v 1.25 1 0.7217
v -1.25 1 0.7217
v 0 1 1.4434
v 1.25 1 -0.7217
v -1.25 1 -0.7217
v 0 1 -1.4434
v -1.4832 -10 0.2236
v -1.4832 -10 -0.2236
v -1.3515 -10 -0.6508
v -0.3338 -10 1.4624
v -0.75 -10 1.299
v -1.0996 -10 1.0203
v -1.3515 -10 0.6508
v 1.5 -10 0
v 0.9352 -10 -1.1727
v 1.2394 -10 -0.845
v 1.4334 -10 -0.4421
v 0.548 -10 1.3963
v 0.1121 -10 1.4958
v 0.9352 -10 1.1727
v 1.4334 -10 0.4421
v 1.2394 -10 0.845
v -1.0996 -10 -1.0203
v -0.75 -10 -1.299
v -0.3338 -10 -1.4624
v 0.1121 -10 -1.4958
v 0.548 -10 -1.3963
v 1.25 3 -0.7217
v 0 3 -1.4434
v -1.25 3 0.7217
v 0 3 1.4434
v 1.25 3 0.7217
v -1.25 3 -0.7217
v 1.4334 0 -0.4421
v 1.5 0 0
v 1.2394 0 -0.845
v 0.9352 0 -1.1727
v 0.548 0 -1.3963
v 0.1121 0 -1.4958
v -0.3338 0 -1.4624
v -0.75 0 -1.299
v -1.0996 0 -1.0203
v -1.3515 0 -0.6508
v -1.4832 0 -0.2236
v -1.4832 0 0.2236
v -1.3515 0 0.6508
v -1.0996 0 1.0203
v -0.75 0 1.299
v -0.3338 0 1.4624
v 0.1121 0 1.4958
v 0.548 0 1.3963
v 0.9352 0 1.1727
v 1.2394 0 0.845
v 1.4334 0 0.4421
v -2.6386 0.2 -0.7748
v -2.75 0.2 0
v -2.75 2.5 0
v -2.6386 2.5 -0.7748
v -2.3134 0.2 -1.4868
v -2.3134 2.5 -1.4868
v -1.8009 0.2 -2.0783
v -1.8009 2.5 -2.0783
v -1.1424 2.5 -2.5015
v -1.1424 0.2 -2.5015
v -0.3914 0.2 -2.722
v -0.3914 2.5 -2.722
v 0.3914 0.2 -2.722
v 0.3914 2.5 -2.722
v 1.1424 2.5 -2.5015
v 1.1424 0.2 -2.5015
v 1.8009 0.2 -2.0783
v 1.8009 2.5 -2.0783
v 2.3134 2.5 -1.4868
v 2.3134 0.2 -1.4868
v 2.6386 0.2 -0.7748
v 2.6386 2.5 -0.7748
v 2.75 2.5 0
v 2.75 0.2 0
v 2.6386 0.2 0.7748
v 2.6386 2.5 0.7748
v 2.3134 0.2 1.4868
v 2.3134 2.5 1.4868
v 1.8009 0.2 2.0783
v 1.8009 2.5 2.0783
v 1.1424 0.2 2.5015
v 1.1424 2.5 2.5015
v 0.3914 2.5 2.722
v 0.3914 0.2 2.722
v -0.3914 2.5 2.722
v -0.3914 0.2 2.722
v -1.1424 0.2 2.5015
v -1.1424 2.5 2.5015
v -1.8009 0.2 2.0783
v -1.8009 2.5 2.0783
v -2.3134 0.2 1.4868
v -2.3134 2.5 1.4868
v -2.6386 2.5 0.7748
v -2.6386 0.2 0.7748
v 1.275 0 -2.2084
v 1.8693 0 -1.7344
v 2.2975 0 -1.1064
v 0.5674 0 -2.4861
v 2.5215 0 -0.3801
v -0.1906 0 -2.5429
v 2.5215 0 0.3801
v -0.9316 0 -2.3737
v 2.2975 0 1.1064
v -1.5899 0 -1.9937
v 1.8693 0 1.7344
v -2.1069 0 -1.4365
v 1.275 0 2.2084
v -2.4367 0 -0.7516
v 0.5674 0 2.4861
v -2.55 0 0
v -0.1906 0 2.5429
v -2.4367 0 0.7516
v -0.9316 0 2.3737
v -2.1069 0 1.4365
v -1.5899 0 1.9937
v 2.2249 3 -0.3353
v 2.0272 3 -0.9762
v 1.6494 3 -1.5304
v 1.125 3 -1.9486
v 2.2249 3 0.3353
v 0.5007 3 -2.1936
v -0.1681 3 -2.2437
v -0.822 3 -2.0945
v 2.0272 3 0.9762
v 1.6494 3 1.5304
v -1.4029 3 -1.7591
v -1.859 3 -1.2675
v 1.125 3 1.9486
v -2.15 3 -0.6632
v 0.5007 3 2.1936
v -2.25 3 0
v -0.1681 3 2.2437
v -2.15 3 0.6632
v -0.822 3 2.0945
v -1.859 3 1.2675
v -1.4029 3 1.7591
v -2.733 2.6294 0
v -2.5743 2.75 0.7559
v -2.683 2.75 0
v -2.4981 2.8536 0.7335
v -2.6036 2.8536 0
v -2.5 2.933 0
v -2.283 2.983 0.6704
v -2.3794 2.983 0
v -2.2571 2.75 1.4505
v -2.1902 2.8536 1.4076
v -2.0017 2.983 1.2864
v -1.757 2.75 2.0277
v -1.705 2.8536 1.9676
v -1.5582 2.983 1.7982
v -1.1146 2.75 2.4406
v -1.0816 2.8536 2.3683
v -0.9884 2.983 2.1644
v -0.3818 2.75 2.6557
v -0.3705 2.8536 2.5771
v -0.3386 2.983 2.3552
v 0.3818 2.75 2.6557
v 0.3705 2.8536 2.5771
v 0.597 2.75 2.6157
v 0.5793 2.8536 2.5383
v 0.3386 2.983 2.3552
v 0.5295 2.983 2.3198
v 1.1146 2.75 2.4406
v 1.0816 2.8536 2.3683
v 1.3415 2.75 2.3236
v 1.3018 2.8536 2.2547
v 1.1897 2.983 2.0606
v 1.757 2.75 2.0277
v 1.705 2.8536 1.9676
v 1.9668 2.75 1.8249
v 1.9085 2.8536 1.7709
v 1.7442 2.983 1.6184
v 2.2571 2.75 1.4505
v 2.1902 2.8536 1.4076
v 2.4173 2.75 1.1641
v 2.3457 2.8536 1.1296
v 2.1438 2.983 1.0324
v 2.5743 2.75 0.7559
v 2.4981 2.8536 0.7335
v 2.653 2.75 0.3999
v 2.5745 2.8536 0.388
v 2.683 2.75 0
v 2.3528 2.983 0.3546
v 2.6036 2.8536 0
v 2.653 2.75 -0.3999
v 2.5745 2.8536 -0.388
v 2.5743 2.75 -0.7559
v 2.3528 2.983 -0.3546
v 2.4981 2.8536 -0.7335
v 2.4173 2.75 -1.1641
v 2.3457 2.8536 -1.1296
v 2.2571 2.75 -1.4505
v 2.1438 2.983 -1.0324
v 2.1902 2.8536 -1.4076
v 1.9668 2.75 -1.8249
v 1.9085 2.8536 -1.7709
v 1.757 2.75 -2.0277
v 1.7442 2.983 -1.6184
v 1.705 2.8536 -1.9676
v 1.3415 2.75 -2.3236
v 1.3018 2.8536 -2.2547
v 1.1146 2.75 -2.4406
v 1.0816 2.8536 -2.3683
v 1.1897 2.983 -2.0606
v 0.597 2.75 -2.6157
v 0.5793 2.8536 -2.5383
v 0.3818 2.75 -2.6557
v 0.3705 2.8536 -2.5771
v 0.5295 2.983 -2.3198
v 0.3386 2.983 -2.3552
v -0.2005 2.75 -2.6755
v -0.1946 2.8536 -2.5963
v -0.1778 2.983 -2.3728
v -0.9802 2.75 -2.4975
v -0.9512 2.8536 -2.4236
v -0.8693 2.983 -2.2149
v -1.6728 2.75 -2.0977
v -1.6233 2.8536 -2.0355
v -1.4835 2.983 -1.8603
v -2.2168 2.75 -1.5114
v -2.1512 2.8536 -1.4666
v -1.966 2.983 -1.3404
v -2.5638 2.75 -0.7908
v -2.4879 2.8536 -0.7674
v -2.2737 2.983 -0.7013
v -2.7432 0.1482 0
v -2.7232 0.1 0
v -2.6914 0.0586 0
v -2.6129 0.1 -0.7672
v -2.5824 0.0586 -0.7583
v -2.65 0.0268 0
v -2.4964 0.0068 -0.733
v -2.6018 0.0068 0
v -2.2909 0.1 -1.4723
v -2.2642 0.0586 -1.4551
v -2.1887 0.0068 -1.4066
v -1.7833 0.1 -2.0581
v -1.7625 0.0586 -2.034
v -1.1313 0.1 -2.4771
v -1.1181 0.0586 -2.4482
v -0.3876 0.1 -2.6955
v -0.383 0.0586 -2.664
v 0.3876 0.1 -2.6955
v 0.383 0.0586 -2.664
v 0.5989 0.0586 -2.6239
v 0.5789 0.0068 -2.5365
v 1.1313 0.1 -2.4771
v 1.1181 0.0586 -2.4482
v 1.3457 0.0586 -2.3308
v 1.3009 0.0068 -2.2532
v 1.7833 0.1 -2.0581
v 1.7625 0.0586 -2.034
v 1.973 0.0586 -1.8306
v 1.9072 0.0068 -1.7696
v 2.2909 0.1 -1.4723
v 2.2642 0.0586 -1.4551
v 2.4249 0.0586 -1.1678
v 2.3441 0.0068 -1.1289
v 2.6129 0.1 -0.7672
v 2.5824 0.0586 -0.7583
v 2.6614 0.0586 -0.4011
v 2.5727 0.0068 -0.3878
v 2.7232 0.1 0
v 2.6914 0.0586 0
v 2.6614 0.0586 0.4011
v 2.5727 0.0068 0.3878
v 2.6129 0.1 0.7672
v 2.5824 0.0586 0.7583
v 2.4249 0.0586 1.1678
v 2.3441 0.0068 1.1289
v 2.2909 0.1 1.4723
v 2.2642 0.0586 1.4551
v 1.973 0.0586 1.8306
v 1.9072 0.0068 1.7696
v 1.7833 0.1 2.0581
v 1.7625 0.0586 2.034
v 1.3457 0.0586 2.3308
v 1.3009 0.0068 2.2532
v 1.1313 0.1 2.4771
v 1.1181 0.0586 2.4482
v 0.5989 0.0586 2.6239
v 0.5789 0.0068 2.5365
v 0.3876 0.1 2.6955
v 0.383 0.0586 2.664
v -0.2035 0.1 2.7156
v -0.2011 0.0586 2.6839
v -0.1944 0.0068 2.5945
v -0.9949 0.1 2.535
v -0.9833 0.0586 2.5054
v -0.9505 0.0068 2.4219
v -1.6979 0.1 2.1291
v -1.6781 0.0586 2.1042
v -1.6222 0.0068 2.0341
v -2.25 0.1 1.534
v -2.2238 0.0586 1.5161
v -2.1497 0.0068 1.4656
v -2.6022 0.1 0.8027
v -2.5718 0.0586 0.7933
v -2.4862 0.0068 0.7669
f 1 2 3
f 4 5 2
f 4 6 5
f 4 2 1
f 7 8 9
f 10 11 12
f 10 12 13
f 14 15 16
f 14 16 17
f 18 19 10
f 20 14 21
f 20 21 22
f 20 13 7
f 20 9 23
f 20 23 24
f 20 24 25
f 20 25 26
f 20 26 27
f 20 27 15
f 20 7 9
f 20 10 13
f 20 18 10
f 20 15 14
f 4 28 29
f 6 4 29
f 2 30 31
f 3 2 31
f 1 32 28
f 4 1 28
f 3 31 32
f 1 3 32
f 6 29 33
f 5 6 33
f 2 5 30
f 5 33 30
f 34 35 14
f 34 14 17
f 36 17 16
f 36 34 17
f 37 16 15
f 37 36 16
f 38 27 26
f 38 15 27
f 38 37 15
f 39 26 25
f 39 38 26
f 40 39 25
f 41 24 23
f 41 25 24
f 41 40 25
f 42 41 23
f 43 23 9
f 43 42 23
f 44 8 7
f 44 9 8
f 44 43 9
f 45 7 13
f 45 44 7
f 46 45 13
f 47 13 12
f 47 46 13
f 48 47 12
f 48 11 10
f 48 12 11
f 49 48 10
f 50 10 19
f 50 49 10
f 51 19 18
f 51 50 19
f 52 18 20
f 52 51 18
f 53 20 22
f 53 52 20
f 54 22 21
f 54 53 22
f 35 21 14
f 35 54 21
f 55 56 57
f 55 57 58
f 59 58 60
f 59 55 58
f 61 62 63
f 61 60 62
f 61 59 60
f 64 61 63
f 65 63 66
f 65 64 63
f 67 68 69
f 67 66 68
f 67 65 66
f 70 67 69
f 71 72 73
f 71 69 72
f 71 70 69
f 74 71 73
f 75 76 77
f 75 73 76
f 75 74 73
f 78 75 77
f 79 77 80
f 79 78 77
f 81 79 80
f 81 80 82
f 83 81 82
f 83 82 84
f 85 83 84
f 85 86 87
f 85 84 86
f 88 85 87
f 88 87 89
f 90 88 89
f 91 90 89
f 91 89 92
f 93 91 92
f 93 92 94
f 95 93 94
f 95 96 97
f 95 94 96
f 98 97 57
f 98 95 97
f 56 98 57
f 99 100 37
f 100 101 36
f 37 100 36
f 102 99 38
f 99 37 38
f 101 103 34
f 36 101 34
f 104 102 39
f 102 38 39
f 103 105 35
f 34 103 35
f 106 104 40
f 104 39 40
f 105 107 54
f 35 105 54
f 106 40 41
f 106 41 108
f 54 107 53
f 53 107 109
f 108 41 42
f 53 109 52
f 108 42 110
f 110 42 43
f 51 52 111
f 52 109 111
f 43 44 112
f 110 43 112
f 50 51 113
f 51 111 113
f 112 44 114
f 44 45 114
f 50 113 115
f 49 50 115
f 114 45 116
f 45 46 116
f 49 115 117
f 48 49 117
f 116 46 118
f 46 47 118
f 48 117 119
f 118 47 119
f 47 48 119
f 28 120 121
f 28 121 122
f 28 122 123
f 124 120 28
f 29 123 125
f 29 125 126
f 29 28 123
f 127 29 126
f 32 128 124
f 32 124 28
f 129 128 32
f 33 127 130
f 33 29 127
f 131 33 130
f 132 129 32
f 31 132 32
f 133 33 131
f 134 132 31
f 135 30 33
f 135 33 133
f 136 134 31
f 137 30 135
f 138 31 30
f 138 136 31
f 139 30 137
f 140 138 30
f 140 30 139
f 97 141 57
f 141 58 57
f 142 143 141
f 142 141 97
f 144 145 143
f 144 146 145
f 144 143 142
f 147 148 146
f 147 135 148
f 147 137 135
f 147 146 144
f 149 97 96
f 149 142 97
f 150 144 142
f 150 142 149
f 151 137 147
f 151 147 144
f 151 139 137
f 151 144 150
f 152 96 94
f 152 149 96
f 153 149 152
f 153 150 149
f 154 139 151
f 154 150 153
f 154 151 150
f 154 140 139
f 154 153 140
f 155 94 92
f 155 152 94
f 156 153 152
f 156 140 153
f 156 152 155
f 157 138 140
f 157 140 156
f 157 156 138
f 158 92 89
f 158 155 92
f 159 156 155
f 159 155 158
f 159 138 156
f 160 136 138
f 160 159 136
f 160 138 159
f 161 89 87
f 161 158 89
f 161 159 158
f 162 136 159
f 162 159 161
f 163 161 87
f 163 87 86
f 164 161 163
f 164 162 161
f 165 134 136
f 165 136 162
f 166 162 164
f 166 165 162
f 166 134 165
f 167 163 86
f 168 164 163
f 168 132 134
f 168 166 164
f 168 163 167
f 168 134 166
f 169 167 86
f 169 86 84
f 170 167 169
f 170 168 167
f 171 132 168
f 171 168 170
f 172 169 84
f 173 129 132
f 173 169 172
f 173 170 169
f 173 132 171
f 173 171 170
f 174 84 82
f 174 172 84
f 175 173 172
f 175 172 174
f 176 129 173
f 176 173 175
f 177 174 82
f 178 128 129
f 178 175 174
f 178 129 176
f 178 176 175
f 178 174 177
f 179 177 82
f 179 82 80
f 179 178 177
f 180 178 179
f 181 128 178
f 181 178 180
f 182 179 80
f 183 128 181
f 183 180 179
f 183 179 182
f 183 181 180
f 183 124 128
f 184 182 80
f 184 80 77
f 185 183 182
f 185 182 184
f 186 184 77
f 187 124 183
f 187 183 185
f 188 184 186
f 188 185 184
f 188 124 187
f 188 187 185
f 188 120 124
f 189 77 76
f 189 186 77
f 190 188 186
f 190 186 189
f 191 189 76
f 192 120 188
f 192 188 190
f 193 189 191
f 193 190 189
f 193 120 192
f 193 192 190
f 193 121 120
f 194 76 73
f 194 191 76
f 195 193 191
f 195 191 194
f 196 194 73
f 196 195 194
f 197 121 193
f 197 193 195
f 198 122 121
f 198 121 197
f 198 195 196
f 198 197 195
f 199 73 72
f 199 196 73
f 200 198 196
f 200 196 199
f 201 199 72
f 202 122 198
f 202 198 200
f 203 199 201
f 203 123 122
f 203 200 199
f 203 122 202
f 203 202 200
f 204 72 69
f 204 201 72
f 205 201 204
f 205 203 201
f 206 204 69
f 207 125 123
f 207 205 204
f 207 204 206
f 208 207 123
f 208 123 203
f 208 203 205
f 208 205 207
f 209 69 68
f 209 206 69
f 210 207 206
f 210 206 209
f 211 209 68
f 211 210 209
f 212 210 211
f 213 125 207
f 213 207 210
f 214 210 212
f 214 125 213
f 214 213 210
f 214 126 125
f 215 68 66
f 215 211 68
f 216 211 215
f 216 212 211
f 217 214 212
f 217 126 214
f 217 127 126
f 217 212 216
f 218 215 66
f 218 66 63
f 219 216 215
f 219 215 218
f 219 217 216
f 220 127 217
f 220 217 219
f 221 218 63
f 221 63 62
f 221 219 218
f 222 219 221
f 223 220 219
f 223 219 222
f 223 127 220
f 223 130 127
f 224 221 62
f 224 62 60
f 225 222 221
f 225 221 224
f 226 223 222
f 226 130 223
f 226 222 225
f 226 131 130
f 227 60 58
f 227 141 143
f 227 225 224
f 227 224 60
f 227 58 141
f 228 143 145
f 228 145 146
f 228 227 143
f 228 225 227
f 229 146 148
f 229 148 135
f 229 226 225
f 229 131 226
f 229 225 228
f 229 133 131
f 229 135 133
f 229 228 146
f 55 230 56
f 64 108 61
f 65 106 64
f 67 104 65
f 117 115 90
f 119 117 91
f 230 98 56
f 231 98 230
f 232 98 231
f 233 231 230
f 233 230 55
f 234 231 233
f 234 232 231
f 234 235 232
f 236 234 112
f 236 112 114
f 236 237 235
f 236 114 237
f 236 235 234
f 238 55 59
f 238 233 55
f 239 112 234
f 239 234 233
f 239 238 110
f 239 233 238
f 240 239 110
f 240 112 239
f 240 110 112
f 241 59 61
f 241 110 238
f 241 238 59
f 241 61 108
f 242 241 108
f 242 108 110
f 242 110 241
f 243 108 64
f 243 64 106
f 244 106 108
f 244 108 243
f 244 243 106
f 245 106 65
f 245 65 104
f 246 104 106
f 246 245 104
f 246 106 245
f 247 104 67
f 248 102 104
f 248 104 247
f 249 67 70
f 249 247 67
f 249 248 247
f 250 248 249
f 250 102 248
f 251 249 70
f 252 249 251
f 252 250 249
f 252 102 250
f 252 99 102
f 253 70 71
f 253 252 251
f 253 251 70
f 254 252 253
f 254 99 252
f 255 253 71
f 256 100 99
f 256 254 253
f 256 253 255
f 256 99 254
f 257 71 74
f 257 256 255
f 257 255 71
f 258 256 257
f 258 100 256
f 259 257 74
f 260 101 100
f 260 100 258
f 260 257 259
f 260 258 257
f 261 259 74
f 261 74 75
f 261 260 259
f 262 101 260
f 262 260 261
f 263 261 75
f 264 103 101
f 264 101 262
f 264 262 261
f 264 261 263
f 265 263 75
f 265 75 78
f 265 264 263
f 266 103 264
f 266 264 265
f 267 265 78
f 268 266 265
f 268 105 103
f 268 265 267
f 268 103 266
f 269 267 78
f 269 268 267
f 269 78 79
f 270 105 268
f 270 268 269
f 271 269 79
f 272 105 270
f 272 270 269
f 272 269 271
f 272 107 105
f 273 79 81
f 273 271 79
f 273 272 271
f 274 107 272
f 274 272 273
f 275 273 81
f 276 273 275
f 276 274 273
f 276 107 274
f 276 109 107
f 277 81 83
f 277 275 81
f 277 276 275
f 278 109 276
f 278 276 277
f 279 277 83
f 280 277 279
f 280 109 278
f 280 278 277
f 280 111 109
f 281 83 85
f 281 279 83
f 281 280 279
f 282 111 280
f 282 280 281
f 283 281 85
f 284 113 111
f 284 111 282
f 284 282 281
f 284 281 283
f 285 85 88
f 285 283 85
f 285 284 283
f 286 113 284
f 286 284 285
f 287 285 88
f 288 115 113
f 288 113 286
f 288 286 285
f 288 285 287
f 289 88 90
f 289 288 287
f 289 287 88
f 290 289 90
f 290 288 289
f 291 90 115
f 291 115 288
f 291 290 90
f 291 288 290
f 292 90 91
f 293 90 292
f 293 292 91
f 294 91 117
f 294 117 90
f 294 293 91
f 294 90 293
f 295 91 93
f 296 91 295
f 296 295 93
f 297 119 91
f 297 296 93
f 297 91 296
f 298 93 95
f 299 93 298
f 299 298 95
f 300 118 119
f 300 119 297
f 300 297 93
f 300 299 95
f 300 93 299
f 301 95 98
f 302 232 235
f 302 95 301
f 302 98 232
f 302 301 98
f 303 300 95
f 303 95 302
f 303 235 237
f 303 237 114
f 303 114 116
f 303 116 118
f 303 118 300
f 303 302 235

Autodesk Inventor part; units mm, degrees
ref_plane "YZ Plane" through (0, 0, 0) normal (1, 0, 0) x (0, 1, 0)
ref_plane "XZ Plane" through (0, 0, 0) normal (0, 1, 0) x (-1, 0, 0)
ref_plane "XY Plane" through (0, 0, 0) normal (0, 0, 1) x (1, 0, 0)
sketch "スケッチ1" plane through (0, 0, 0) normal (0, 1, 0) x (-1, 0, 0)
  circle A0 centre (0, 0) radius 2.75
  dimension "d0" = 5.5
extrude "押し出し1" add sketch "スケッチ1" along normal blind 3
sketch "スケッチ2" plane through (0, 0, 0) normal (0, -1, 0) x (1, 0, 0)
  circle A0 centre (0, 0) radius 1.5
  dimension "d3" = 3
extrude "押し出し2" add sketch "スケッチ2" along normal blind 10
fillet "フィレット1" radius 0.5 1 edges at (2.75, 3, 0)
fillet "フィレット1" radius 0.2 1 edges at (2.75, 0, 0)
sketch "スケッチ3" plane through (0, 3, 0) normal (0, 1, 0) x (1, 0, 0)
  line L0 (0, 1.4434) -> (-1.25, 0.7217)
  line L1 (-1.25, 0.7217) -> (-1.25, -0.7217)
  line L2 (-1.25, -0.7217) -> (0, -1.4434)
  line L3 (0, -1.4434) -> (1.25, -0.7217)
  line L4 (1.25, -0.7217) -> (1.25, 0.7217)
  line L5 (1.25, 0.7217) -> (0, 1.4434)
  line L6 (0, 1.4434) -> (0, -1.4434) construction
  circle A0 centre (0, 0) radius 1.4434 construction
  dimension "d12" = 2.5
extrude "押し出し3" cut sketch "スケッチ3" against normal blind 2
thread "ねじ1" size "M3x0.5" class "6g" standard "ANSI Metric M Profile" full length
properties part number "M3-CapScrew"
